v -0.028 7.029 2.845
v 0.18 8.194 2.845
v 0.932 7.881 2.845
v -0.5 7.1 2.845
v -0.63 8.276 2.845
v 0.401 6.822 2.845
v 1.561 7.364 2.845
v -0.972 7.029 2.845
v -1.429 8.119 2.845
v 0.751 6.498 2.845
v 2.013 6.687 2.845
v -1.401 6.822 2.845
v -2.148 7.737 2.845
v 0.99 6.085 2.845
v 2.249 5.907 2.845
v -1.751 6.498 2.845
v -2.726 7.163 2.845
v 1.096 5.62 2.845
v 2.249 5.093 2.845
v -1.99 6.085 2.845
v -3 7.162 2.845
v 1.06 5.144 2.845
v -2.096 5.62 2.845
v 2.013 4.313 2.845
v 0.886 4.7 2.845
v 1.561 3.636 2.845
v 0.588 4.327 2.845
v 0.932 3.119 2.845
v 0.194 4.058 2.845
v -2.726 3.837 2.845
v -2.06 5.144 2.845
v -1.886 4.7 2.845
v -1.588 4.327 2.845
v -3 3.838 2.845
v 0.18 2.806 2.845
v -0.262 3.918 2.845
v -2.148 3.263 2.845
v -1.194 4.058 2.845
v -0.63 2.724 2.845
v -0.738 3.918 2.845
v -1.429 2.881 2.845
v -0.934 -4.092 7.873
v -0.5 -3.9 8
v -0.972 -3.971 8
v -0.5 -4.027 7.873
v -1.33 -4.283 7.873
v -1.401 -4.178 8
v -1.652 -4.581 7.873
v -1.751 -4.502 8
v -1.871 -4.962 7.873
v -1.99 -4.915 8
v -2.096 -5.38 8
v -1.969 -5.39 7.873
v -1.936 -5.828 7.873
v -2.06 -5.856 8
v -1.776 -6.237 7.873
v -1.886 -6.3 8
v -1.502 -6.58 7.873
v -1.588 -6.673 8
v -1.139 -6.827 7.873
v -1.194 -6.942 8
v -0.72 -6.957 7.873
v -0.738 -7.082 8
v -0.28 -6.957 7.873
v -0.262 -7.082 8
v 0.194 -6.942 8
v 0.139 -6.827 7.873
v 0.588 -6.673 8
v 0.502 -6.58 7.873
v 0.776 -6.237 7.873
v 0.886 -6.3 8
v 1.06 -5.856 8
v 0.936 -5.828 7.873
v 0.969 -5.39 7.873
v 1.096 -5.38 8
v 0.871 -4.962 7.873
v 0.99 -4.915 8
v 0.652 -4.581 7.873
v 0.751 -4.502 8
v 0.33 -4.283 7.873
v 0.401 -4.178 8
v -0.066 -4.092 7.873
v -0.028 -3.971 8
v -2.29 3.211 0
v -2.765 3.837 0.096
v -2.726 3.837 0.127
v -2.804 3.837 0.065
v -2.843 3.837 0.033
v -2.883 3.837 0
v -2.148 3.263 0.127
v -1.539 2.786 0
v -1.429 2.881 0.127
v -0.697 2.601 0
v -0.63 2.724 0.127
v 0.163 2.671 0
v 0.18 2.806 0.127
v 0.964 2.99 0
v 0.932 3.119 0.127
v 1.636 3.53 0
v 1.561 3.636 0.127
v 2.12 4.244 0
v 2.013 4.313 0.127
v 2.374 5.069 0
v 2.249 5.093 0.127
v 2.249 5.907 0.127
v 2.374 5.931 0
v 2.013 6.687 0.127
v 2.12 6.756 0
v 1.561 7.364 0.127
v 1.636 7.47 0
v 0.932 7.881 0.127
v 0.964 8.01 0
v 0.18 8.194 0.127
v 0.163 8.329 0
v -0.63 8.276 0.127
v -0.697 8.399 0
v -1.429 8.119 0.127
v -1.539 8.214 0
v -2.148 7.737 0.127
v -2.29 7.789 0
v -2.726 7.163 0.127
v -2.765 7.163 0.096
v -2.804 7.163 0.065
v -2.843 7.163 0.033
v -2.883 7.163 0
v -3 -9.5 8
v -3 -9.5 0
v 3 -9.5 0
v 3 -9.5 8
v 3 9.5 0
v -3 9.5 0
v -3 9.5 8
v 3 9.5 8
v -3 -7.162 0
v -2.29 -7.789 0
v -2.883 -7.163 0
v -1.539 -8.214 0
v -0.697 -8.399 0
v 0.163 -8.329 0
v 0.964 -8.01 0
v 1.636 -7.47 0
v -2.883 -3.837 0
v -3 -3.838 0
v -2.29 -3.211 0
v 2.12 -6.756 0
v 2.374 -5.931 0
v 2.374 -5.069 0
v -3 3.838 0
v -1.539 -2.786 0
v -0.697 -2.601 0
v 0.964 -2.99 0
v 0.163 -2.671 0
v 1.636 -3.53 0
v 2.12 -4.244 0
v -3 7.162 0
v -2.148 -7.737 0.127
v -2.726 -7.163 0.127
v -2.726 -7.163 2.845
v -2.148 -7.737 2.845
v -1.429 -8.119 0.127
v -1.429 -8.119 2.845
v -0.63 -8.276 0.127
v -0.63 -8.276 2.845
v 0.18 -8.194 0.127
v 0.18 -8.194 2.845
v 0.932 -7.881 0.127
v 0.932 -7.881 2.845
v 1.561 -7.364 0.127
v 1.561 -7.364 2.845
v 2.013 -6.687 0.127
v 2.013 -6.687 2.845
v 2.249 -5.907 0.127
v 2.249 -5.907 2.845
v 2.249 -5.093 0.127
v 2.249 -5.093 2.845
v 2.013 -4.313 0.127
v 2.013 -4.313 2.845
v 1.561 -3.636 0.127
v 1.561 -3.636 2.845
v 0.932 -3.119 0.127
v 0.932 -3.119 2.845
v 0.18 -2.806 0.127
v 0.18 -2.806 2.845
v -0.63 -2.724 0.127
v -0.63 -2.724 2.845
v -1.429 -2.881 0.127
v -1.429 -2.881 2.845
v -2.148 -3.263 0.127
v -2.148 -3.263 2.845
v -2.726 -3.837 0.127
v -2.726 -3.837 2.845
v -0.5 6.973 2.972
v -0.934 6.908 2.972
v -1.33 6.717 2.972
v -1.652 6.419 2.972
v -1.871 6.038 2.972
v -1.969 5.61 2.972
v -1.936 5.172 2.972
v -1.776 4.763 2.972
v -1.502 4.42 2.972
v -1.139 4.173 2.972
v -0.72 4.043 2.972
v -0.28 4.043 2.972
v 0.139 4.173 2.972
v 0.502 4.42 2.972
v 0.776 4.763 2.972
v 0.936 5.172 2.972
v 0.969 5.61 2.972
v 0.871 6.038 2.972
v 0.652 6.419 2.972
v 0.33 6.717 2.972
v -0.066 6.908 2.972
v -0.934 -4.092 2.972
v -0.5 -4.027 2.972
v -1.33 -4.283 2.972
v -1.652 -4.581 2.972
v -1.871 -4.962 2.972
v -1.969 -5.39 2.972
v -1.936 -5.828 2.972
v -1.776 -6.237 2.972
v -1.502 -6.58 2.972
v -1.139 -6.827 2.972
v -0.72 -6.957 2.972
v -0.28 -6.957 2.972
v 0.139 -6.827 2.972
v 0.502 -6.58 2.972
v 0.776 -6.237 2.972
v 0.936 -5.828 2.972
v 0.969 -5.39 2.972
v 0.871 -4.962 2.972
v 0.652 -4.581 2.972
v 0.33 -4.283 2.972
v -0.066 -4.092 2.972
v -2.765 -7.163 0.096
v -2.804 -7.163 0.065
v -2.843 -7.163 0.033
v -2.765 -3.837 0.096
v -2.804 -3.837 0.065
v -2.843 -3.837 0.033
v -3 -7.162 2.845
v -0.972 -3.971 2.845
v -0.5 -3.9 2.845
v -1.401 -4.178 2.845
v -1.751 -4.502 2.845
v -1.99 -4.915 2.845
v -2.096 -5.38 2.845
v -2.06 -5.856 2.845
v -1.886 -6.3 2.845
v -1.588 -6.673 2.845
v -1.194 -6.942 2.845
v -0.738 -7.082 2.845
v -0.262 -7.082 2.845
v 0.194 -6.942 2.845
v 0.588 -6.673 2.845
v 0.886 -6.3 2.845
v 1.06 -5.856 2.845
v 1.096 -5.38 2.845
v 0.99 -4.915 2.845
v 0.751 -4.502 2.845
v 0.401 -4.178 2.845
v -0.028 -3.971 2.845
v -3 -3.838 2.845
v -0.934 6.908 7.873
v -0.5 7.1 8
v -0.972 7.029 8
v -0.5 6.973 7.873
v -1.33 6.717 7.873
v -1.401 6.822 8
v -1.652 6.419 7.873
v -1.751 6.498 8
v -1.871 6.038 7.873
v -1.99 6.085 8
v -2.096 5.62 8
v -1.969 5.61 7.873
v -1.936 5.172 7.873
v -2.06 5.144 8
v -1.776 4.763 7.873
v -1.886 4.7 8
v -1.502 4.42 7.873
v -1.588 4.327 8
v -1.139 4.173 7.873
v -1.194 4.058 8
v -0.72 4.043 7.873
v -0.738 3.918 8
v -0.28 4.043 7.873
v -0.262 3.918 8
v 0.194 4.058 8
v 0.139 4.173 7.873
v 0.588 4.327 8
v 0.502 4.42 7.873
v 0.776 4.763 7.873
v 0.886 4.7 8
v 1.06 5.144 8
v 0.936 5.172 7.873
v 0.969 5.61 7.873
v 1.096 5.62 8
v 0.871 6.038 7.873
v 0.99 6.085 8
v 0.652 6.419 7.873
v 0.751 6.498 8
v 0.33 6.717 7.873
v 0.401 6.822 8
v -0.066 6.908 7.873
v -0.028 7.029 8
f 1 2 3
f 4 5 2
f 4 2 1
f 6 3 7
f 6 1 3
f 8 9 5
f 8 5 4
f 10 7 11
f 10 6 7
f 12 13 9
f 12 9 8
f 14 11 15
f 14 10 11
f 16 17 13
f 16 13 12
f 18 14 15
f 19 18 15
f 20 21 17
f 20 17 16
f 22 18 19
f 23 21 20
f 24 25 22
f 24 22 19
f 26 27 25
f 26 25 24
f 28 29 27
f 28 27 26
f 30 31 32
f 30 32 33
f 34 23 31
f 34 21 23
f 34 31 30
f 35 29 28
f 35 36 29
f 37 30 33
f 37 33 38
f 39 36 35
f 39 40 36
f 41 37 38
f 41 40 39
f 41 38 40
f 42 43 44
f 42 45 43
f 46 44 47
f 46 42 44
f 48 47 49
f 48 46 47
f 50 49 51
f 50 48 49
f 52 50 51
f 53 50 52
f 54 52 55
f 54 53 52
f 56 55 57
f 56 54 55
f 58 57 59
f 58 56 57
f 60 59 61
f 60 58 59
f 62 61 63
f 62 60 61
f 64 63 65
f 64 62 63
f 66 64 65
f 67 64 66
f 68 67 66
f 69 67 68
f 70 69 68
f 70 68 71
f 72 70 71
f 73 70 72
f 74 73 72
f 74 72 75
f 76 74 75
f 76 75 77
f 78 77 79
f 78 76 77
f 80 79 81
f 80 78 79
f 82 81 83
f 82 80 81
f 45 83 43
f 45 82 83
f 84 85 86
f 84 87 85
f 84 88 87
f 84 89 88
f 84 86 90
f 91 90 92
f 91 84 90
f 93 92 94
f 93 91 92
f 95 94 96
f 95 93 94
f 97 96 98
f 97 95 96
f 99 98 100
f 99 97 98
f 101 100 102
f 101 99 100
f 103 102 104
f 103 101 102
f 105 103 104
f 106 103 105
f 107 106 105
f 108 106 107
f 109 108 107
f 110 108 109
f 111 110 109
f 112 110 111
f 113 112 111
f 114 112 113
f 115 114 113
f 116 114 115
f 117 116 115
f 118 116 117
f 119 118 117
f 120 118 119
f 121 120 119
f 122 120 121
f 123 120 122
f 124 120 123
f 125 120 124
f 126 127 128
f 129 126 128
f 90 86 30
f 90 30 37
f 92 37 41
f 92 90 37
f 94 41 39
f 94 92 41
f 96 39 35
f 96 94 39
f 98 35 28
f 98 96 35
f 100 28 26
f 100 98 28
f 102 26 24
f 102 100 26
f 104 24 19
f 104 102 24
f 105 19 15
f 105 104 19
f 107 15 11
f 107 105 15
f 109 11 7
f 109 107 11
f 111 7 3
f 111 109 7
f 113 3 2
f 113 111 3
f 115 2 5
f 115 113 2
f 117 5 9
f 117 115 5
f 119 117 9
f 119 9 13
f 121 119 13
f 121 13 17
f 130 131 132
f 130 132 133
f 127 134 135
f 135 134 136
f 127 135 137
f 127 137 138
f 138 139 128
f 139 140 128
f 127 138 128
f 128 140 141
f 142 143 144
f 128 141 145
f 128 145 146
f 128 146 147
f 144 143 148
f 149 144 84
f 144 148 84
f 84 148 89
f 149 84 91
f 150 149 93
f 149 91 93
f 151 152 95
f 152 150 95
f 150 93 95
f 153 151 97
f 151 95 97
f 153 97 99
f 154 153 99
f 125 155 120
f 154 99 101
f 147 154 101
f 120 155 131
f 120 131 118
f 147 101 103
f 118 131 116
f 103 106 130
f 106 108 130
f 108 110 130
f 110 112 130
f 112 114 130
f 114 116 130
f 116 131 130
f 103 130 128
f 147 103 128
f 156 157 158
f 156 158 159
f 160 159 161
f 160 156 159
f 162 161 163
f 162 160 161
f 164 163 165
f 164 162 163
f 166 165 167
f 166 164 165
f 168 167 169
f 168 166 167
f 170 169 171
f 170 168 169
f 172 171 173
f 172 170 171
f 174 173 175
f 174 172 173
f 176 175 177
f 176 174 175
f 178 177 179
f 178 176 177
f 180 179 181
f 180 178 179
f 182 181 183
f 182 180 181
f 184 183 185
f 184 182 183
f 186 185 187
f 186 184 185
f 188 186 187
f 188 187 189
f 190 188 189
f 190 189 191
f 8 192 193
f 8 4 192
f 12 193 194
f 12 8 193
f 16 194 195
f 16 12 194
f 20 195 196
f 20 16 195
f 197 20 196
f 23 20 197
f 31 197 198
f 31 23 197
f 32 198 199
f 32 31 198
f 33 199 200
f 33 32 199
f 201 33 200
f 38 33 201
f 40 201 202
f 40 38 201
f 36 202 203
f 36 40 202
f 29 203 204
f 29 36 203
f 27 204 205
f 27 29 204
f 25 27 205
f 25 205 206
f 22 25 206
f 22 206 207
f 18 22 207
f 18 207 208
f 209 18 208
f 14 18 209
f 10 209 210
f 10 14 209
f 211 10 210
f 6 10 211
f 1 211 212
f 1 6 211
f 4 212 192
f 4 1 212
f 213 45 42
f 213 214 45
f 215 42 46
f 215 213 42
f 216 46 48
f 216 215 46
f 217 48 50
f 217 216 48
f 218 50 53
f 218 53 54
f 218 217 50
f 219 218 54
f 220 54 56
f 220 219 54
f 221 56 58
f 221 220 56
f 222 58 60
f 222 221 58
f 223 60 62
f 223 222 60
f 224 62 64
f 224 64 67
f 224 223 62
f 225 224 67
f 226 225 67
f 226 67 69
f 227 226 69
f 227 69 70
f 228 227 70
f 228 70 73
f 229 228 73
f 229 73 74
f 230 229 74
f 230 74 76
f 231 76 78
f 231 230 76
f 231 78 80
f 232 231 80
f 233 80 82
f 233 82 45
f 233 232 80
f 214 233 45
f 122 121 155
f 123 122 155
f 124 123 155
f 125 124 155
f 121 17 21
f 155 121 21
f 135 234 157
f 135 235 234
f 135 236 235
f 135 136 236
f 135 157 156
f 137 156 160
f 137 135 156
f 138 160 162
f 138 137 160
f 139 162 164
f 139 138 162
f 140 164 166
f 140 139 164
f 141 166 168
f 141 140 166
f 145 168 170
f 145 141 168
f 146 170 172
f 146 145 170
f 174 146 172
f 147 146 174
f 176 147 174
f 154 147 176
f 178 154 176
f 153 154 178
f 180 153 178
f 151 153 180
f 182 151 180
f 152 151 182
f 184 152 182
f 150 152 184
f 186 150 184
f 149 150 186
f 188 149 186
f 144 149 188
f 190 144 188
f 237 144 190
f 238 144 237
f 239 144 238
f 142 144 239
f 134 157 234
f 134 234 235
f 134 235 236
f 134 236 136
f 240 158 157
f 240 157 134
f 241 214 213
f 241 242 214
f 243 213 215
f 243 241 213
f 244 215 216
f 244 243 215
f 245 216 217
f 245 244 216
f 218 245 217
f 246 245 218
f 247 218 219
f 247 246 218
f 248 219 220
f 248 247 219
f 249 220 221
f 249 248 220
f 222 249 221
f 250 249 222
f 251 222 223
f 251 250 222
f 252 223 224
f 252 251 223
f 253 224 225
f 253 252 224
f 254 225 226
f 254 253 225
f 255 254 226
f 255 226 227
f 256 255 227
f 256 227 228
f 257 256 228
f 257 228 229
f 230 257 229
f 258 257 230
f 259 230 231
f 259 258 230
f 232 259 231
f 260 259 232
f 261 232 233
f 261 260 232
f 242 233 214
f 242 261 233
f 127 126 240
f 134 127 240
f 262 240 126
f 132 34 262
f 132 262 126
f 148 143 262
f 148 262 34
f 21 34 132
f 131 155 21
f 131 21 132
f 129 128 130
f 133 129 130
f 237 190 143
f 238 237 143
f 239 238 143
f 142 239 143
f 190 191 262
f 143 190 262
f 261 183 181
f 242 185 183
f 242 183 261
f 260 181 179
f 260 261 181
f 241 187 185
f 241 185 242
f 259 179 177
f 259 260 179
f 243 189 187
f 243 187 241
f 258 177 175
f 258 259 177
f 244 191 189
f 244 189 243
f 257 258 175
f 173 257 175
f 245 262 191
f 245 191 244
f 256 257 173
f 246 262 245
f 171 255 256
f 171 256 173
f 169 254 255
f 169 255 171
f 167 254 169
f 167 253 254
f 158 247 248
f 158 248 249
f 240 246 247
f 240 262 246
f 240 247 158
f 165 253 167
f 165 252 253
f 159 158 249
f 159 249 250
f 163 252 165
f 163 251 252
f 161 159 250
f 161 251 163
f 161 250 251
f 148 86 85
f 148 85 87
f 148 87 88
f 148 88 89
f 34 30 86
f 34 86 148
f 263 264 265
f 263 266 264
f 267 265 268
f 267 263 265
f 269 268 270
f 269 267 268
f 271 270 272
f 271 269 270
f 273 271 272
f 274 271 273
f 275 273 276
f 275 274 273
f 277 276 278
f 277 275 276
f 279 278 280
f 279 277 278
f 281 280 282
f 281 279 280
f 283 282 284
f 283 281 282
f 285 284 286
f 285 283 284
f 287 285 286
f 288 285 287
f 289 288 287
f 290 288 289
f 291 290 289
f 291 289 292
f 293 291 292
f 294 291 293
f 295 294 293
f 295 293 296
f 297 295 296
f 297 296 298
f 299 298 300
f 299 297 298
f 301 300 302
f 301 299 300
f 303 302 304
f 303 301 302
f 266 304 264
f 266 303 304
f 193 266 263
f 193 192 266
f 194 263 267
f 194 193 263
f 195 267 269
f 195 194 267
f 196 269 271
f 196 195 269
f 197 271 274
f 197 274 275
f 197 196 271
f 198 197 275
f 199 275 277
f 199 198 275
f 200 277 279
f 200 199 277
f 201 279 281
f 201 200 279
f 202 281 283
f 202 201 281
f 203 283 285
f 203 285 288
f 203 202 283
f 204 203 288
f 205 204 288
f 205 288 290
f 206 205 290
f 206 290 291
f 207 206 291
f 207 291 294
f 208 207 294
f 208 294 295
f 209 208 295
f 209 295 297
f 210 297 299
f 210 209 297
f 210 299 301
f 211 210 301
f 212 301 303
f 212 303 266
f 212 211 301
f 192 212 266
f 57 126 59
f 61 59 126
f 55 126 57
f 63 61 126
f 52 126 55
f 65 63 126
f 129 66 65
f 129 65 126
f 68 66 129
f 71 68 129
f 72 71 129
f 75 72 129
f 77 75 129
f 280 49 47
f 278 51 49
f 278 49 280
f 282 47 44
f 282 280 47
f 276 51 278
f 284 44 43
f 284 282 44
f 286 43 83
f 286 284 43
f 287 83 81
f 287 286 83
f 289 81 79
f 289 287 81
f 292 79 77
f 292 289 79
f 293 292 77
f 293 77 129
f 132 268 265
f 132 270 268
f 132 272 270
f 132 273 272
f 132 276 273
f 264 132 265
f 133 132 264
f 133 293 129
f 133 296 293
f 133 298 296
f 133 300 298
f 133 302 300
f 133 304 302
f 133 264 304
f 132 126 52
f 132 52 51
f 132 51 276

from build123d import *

# Parameters (mm, degrees)
SKETCH_1_W                = 6
SKETCH_1_H                = 19
EXTRUDE_1_DEPTH           = 8
HOLE_WIZARD_41_AT_2_COUNT = 2
HOLE_WIZARD_41_AT_2_PITCH = 11
CHAMFER_1_SIZE            = 0.449397949


with BuildPart() as part:
    # Эскиз1 → Бобышка-Вытянуть1 (new body)
    with BuildSketch(Plane.XY):
        Rectangle(SKETCH_1_W, SKETCH_1_H)
    extrude(amount=EXTRUDE_1_DEPTH)

    # Эскиз2 → Цековка для  винта с внутренним шестигранником #41 (revolve, cut)
    with BuildSketch(Plane(origin=(-0.5, 5.5, 0), x_dir=(0, 1, 0), z_dir=(1, 0, 0))):
        Polygon((0, 0), (0, 8), (1.6002, 8), (1.4732, 7.873), (1.4732, 2.9718), (1.6002, 2.8448), (2.77876, 2.8448), (2.77876, 0.127), (2.90576, 0), align=None)
    hole_wizard_41 = revolve(axis=Axis((-0.5, 5.5, -6.35), (0, 0, 1)), mode=Mode.SUBTRACT)

    # Цековка для  винта с внутренним шестигранником #41 at 2: Цековка для  винта с внутренним шестигранником #41 ×2
    with Locations(*[(0, -i * HOLE_WIZARD_41_AT_2_PITCH, 0) for i in range(1, HOLE_WIZARD_41_AT_2_COUNT)]):
        add(hole_wizard_41, mode=Mode.SUBTRACT)

    # Фаска1
    # the kernel refuses this chamfer: 0.5, 0.449397949 mm, written as the material it takes off along each edge
    with BuildSketch(Plane(origin=(-3, -4.286943061, 2.8448), x_dir=(0.5198491944846588, 0.8542580494169495, 0), z_dir=(0, 0, -1)), Plane(origin=(-3, 6.713056939, 2.8448), x_dir=(0.5198491944846584, 0.8542580494169496, 0), z_dir=(0, 0, -1))) as chamfer_1_piece_1:
        with BuildLine():
            Line((0.526718663, 0), (CHAMFER_1_SIZE * 0.854258048776, -CHAMFER_1_SIZE * 0.519849194094))
            Line((CHAMFER_1_SIZE * 0.854258048776, -CHAMFER_1_SIZE * 0.519849194094), (0, 0))
            ThreePointArc((0, 0), (0.268614935, -0.012503234), (0.526718663, 0))
        make_face()
    extrude(amount=4.061353185, mode=Mode.SUBTRACT)
    with BuildSketch(Plane(origin=(-3, -6.713056939, 2.8448), x_dir=(0.519849194484659, -0.8542580494169493, 0), z_dir=(0, 0, -1)), Plane(origin=(-3, 4.286943061, 2.8448), x_dir=(0.519849194484659, -0.8542580494169493, 0), z_dir=(0, 0, -1))) as chamfer_1_piece_2:
        with BuildLine():
            Line((0.526718663, 0), (CHAMFER_1_SIZE * 0.854258048776, CHAMFER_1_SIZE * 0.519849194094))
            Line((CHAMFER_1_SIZE * 0.854258048776, CHAMFER_1_SIZE * 0.519849194094), (0, 0))
            ThreePointArc((0, 0), (0.268614935, 0.012503234), (0.526718663, 0))
        make_face()
    extrude(amount=4.061353185, mode=Mode.SUBTRACT)


solid = part.part
